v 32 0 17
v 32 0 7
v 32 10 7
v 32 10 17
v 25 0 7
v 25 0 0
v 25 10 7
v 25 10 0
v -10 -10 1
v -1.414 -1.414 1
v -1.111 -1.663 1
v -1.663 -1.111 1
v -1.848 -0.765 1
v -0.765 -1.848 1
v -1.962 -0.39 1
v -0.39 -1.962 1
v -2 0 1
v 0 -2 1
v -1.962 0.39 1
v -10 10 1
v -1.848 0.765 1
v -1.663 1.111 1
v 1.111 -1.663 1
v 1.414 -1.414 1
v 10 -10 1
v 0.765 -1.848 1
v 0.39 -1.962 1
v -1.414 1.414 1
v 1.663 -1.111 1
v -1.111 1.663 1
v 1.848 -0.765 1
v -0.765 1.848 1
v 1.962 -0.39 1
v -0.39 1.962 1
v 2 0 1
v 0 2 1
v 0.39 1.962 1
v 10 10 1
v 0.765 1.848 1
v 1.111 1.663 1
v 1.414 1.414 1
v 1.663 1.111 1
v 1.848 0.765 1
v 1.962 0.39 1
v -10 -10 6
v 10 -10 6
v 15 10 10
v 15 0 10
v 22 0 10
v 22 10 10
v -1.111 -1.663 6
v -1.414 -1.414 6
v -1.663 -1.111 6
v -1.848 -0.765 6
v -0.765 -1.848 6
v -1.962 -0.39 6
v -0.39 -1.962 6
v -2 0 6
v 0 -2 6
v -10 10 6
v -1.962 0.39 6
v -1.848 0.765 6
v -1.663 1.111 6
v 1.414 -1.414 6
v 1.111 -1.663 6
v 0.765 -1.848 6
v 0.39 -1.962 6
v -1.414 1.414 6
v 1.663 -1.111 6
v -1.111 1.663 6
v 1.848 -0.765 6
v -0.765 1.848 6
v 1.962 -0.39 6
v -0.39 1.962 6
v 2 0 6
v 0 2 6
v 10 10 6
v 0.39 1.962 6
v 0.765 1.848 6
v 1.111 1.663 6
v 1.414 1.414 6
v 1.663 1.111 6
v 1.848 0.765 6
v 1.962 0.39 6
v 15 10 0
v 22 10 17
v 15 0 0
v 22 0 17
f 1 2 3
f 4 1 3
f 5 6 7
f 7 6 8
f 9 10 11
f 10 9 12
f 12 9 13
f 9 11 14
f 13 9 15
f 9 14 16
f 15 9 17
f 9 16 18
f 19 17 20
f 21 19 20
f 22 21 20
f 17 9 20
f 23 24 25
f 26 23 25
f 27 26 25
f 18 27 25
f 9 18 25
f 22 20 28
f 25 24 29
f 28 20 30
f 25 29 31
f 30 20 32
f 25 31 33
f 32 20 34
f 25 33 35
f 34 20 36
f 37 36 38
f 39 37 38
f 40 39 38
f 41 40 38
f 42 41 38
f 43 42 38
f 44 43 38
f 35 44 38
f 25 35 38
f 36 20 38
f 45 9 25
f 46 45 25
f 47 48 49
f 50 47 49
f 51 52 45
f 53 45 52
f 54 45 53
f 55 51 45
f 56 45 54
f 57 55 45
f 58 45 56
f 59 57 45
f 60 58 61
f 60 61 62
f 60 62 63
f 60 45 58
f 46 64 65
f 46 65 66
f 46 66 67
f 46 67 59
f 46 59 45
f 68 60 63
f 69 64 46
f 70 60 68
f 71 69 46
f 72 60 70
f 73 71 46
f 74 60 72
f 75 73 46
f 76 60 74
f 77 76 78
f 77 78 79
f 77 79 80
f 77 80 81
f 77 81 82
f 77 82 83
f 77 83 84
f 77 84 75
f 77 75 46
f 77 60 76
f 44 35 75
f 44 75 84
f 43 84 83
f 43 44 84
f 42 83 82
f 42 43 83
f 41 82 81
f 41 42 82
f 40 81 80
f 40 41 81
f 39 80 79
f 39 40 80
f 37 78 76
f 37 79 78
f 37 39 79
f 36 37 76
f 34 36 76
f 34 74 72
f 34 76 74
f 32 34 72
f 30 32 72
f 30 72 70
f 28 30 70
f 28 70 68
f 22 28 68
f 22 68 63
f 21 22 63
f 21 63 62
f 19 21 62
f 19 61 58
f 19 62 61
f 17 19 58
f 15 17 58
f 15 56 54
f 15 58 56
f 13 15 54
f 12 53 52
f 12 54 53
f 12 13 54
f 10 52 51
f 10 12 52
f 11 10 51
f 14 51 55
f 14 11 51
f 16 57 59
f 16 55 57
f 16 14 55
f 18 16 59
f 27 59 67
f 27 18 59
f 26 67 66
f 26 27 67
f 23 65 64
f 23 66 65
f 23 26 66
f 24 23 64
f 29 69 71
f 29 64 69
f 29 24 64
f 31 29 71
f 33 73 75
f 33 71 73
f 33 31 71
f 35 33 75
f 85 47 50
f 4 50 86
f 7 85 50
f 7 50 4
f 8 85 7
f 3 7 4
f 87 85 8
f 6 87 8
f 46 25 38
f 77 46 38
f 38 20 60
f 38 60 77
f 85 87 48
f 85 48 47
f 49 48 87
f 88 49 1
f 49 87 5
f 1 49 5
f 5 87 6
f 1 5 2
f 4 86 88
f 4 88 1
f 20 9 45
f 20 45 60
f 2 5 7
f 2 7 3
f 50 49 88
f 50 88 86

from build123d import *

# Parameters (mm, degrees)
CYLINDER_R     = 2
CYLINDER_DEPTH = 10
BOX_W          = 20
BOX_H          = 20
BOX_DEPTH      = 5
BOX001_W       = 10
BOX001_H       = 10
BOX001_DEPTH   = 10
BOX002_W       = 10
BOX002_H       = 10
BOX002_DEPTH   = 10


with BuildPart() as cylinder:
    # Cylinder → Cylinder (new body)
    with BuildSketch(Plane.XY):
        Circle(CYLINDER_R)
    extrude(amount=CYLINDER_DEPTH)


with BuildPart() as cut:
    # Box → Box (new body)
    with BuildSketch(Plane(origin=(-10, -10, 1), x_dir=(1, 0, 0), z_dir=(0, 0, 1))):
        with Locations((10, 10)):
            Rectangle(BOX_W, BOX_H)
    extrude(amount=BOX_DEPTH)

    # Cut: cut Cylinder
    add(cylinder.part, mode=Mode.SUBTRACT)


with BuildPart() as cube001:
    # Box001 → Box001 (new body)
    with BuildSketch(Plane(origin=(15, 0, 0), x_dir=(1, 0, 0), z_dir=(0, 0, 1))):
        with Locations((5, 5)):
            Rectangle(BOX001_W, BOX001_H)
    extrude(amount=BOX001_DEPTH)


with BuildPart() as fusion:
    # Box002 → Box002 (new body)
    with BuildSketch(Plane(origin=(22, 0, 7), x_dir=(1, 0, 0), z_dir=(0, 0, 1))):
        with Locations((5, 5)):
            Rectangle(BOX002_W, BOX002_H)
    extrude(amount=BOX002_DEPTH)

    # Fusion: union Cube001
    add(cube001.part)


solid = Compound([cut.part, fusion.part])
